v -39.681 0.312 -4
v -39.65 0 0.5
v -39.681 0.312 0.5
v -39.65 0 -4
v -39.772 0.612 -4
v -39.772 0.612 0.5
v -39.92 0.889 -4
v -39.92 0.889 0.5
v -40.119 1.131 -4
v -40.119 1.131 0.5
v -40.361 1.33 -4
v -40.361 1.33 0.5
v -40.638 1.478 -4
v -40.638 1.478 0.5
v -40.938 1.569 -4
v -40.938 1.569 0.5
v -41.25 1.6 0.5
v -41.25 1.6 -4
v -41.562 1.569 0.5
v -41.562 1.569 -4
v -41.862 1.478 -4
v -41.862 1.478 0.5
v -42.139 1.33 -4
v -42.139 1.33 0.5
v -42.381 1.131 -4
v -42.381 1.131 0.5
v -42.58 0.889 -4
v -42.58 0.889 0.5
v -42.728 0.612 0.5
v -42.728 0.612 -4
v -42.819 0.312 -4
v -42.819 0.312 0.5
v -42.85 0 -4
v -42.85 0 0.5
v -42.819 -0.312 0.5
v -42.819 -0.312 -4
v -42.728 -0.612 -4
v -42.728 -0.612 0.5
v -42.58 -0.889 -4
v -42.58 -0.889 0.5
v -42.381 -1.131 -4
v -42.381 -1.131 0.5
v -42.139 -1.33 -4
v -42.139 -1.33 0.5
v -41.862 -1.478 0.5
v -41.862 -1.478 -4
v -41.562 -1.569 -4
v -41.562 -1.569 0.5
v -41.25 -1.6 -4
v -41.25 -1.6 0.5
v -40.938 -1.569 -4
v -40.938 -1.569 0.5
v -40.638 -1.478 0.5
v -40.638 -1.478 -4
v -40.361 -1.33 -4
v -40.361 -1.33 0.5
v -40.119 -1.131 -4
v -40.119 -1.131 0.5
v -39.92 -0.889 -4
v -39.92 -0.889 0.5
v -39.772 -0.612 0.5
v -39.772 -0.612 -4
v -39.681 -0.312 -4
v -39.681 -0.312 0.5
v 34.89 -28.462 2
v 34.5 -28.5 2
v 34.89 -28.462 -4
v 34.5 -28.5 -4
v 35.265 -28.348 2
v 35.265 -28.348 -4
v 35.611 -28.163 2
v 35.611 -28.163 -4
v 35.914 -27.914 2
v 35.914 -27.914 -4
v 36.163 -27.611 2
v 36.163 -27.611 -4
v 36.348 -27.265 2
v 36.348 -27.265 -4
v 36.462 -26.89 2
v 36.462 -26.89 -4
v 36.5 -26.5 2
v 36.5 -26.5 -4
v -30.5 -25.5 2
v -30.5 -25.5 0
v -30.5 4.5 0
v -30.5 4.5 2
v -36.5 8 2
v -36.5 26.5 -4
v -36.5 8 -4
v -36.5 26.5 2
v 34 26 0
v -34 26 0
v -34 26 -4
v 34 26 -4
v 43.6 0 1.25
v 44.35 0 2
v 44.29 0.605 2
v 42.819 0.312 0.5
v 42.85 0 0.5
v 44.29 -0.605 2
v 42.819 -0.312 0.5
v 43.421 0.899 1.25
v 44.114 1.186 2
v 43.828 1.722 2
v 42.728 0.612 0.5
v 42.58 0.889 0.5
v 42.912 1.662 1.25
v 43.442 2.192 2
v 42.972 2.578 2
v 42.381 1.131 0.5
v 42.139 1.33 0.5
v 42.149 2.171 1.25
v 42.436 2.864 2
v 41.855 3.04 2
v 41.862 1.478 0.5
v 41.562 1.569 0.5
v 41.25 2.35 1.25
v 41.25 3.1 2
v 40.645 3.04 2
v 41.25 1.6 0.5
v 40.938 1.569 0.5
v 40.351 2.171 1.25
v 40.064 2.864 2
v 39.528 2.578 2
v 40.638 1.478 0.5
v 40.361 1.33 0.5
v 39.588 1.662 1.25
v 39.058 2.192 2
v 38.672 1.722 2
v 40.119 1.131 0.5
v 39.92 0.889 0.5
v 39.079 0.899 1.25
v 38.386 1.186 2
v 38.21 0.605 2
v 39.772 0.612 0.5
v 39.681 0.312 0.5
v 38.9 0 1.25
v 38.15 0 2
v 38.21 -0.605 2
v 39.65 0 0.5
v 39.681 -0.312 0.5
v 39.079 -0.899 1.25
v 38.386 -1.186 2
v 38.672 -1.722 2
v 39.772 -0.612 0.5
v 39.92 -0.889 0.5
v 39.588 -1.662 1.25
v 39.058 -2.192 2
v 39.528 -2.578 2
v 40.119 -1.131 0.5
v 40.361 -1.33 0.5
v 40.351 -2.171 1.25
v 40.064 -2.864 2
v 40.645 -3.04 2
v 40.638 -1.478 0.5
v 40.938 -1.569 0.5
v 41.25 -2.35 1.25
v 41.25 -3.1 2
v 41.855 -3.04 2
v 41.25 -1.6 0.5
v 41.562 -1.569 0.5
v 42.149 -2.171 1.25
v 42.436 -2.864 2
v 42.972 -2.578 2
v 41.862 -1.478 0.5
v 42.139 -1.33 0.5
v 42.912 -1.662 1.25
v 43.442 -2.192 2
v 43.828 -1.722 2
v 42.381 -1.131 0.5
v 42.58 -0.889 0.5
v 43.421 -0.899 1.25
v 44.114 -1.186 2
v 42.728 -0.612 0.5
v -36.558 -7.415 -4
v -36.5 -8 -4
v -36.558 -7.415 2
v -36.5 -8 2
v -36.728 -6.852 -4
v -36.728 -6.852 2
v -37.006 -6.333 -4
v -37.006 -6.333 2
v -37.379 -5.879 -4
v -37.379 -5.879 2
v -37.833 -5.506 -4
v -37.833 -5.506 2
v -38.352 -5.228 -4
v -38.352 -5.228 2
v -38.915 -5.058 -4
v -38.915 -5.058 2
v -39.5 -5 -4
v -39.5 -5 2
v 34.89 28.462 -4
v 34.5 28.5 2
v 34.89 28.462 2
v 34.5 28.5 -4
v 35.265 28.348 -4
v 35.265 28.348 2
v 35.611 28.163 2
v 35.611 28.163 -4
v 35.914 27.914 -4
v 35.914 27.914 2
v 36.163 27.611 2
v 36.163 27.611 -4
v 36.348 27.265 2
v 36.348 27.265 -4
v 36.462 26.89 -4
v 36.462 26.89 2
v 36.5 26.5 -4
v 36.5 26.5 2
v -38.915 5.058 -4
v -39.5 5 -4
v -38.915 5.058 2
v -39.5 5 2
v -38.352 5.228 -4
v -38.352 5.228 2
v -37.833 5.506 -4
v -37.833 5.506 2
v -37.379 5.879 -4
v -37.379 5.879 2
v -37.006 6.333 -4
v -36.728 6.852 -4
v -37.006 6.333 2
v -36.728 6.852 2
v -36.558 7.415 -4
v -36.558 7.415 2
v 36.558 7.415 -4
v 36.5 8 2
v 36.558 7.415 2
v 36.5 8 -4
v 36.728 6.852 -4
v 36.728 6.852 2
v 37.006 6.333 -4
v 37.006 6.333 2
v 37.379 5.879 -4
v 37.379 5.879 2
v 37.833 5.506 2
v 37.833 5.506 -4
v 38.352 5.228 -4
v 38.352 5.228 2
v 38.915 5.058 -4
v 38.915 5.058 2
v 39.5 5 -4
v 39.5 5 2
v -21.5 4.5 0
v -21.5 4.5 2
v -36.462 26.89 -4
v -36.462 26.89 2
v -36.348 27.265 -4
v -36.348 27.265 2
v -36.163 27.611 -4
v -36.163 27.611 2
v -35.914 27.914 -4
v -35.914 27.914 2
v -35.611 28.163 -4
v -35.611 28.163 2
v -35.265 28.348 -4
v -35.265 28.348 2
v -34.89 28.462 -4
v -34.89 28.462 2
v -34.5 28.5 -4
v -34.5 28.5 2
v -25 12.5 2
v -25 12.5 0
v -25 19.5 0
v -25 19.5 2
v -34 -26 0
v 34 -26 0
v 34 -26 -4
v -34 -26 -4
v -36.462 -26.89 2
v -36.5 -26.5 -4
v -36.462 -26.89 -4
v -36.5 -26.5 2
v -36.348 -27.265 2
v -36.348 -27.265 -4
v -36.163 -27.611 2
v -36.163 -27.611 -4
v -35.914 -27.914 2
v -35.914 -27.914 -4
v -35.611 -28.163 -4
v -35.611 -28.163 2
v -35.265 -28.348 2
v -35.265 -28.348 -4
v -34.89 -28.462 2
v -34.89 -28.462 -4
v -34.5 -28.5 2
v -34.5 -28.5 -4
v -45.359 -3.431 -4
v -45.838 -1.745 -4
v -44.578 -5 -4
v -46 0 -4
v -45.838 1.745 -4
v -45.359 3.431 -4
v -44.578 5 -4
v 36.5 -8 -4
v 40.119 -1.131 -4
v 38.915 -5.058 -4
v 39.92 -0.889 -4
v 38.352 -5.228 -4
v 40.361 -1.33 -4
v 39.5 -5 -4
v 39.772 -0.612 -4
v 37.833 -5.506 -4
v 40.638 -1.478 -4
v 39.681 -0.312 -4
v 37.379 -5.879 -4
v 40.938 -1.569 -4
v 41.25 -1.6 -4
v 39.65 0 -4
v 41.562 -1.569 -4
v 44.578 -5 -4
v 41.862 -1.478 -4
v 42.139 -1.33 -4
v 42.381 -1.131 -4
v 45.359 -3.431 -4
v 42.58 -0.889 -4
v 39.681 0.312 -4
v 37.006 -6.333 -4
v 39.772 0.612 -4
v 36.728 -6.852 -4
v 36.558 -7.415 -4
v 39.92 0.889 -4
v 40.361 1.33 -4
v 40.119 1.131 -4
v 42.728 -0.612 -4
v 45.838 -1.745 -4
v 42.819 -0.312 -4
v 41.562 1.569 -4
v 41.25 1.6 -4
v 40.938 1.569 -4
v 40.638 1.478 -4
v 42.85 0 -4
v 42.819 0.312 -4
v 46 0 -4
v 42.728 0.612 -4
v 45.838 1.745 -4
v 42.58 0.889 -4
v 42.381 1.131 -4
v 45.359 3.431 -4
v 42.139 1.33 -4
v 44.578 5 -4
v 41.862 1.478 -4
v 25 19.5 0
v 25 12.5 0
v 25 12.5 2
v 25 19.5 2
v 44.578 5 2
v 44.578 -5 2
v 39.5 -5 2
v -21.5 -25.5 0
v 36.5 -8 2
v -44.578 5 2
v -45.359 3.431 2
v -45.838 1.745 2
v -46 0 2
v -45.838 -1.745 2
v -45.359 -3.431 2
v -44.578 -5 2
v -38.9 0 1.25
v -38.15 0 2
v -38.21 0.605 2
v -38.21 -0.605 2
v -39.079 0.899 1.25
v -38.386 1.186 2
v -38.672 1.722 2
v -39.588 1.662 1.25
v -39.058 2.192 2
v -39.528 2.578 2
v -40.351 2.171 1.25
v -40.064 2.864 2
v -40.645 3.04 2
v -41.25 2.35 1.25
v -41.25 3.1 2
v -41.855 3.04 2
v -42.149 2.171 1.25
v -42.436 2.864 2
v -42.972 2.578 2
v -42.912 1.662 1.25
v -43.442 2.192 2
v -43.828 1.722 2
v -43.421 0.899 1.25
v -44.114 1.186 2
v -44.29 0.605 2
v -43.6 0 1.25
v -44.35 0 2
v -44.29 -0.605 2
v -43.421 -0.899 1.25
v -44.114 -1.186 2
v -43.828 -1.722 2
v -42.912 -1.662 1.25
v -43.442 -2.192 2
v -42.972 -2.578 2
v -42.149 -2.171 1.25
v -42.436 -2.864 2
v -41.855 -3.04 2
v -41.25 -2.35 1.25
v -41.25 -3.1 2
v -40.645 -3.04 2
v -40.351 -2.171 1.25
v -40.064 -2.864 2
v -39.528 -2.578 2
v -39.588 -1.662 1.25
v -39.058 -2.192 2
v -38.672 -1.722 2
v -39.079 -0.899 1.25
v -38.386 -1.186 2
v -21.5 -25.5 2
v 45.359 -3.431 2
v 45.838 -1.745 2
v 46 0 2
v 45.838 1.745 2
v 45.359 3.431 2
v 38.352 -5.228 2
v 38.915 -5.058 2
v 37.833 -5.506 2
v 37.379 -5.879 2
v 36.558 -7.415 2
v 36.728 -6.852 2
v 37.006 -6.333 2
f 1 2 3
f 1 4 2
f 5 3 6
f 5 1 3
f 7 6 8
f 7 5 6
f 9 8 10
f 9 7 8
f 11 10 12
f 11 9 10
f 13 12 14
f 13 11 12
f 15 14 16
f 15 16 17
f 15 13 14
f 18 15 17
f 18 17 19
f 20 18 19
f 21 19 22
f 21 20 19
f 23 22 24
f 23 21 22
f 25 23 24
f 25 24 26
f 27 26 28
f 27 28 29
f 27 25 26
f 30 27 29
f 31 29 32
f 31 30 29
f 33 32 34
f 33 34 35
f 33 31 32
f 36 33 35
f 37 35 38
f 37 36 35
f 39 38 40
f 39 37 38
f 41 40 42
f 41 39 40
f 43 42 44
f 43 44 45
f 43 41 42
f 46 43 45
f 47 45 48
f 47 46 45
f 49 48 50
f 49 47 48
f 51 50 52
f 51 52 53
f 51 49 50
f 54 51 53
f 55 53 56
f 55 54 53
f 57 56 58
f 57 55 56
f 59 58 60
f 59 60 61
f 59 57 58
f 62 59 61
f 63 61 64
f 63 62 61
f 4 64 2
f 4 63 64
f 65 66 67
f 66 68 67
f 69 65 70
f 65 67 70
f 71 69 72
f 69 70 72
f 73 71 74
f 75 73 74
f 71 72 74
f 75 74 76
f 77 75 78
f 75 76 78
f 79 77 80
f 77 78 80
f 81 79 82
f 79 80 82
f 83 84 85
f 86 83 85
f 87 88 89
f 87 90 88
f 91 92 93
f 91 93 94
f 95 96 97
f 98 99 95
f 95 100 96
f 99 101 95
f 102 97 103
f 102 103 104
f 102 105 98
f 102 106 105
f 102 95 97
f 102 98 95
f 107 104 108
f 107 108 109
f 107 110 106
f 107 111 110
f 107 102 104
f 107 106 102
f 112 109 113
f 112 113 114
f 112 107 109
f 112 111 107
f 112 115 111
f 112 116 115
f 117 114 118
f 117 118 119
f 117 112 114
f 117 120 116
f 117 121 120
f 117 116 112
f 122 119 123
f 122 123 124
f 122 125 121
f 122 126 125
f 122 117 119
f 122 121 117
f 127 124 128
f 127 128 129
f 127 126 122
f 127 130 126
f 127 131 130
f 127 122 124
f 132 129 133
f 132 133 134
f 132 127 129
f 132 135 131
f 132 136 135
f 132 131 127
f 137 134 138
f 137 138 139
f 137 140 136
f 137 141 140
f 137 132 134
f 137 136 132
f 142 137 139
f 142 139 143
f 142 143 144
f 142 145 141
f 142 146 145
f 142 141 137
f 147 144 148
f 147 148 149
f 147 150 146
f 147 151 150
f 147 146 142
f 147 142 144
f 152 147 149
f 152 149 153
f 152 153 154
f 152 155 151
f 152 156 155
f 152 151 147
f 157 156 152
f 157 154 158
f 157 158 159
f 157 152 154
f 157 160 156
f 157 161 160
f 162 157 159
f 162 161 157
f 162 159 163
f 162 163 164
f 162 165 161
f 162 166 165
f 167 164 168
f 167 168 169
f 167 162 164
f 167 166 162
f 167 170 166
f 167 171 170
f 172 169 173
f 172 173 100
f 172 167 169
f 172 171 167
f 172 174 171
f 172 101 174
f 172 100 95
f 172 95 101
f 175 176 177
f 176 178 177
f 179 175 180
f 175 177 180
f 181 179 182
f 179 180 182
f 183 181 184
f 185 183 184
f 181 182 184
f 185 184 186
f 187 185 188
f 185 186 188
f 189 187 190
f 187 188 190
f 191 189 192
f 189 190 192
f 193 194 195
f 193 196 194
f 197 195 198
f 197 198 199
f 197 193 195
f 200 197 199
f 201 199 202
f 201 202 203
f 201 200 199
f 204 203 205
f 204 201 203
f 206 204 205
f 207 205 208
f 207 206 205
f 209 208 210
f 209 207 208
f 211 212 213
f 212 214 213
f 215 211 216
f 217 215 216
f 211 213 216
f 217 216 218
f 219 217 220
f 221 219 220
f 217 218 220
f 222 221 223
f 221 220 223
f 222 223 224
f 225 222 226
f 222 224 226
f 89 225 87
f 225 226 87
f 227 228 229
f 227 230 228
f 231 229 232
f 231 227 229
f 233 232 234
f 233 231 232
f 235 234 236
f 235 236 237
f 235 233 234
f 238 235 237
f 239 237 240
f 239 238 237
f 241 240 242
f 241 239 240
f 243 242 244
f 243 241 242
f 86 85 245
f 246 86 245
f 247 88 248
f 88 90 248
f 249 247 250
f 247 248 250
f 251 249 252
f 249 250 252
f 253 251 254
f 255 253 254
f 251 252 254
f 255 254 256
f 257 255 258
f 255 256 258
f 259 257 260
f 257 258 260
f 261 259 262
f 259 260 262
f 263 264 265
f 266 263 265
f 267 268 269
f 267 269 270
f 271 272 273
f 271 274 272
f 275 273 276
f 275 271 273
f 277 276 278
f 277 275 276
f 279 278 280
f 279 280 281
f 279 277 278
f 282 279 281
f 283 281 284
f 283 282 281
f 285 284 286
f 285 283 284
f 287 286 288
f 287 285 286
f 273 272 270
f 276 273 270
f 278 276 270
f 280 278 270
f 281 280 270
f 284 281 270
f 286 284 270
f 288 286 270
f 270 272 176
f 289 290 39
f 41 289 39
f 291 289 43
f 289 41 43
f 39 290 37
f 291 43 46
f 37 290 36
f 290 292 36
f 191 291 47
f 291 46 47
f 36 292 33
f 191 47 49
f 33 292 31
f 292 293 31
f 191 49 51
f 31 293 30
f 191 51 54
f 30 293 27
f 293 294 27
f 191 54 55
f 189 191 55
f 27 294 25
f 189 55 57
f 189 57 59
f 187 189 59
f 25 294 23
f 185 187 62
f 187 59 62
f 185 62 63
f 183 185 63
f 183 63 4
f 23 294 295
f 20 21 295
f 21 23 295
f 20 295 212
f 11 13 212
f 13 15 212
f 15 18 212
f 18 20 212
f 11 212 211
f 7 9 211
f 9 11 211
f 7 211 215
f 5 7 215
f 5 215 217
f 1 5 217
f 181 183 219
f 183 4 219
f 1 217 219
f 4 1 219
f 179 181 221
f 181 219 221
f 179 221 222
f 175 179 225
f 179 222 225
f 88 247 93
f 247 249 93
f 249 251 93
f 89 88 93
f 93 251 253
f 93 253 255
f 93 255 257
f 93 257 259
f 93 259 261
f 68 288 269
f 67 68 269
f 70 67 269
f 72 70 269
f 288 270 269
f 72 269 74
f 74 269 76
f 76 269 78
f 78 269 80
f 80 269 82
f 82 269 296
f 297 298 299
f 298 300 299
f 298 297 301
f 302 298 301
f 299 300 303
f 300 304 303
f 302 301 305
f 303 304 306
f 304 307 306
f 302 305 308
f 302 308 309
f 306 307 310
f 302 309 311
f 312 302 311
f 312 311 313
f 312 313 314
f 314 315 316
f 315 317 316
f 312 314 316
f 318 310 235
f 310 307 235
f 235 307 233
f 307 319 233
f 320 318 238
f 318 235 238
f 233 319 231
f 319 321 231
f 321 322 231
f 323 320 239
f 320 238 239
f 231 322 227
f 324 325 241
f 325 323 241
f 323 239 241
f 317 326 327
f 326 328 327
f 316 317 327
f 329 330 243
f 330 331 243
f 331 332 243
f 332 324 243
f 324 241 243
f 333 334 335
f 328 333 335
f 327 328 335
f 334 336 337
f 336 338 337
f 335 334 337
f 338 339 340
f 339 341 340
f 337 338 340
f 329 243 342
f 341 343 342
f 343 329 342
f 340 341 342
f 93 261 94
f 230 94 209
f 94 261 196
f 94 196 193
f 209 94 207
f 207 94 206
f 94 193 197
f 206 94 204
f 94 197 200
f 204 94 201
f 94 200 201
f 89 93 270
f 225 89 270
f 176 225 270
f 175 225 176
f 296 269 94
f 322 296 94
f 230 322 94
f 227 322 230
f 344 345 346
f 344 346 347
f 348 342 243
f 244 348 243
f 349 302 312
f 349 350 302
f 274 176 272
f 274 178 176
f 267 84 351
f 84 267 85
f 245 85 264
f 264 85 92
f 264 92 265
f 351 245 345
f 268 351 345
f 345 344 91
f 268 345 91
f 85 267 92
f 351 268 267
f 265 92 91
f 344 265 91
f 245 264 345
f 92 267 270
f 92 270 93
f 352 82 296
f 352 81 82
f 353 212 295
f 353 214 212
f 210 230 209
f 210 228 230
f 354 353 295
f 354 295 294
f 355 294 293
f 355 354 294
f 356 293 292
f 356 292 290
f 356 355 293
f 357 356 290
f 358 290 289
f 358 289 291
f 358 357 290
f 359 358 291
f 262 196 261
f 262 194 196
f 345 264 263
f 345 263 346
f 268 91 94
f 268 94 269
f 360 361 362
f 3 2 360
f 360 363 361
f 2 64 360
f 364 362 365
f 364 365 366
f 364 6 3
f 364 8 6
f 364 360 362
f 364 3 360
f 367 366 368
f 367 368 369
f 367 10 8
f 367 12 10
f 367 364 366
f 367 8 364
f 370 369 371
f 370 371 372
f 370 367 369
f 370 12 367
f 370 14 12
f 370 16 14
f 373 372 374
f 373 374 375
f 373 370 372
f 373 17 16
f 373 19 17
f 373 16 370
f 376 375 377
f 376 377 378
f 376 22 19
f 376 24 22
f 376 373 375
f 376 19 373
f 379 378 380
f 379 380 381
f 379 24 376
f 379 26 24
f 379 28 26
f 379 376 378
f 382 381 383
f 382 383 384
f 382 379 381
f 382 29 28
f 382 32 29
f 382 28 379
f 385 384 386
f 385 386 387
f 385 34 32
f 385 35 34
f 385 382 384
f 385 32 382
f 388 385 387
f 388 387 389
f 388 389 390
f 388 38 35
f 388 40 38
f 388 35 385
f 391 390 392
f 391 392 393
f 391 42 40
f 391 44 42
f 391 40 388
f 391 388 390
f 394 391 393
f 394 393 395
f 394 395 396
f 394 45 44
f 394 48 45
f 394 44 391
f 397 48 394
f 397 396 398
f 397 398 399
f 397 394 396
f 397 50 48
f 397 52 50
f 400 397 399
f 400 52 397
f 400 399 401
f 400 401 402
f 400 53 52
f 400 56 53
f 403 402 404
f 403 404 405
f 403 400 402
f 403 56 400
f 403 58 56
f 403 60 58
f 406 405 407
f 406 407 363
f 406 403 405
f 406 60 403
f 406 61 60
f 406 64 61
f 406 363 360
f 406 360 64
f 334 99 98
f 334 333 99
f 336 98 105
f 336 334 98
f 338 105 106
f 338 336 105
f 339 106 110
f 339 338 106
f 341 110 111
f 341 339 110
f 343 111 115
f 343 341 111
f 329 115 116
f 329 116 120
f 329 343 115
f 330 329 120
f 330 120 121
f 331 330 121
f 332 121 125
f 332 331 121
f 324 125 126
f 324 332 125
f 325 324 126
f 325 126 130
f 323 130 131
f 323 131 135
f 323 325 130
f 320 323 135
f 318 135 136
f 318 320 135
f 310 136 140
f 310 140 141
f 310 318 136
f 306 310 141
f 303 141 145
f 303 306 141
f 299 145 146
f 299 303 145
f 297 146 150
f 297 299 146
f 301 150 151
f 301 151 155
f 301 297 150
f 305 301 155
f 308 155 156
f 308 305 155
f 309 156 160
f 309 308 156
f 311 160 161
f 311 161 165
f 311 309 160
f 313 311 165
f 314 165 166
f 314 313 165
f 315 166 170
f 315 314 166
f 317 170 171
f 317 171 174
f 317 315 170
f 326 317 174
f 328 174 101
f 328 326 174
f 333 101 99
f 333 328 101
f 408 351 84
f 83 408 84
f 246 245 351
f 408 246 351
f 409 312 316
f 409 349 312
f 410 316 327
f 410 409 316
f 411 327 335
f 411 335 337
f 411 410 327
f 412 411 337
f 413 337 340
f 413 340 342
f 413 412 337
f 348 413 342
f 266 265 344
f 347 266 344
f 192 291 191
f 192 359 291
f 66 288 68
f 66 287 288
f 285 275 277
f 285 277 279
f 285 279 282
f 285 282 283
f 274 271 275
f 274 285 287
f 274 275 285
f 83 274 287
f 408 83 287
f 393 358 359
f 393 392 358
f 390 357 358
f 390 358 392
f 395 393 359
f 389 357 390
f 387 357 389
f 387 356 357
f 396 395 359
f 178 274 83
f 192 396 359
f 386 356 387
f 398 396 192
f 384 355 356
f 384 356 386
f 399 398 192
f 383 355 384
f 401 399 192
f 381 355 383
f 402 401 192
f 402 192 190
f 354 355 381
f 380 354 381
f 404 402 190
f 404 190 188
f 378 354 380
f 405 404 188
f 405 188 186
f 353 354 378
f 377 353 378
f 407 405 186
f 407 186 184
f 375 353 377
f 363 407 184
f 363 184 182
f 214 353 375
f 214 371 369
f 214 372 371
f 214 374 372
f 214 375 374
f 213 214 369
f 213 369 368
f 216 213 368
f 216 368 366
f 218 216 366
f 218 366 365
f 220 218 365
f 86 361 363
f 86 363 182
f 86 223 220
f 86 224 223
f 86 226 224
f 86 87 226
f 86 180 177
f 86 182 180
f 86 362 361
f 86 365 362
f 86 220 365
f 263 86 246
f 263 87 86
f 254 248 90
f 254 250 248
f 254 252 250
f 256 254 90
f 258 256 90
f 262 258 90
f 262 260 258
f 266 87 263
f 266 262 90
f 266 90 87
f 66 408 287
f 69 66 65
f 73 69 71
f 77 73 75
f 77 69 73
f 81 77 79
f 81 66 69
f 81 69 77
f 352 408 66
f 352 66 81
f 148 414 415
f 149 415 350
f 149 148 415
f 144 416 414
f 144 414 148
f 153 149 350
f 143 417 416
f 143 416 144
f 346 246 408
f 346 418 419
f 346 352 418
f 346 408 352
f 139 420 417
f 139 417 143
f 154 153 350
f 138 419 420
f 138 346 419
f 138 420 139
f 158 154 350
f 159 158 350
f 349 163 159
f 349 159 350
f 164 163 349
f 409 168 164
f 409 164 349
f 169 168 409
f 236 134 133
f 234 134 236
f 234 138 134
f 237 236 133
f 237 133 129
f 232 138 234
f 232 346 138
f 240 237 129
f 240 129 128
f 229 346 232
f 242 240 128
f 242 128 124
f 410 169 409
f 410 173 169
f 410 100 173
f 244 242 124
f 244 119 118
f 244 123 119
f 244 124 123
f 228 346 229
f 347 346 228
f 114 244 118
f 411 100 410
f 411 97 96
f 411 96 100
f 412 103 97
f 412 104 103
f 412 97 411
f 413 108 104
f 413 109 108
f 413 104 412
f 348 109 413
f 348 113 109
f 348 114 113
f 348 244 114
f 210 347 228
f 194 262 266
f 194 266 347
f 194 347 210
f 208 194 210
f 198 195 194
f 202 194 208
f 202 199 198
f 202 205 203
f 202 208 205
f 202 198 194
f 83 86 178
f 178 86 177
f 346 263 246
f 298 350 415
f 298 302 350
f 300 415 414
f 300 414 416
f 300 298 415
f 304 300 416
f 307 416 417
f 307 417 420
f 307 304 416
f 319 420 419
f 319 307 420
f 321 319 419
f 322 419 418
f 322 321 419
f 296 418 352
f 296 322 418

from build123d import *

# Parameters (mm, degrees)
F0_W     = 50
F0_H     = 7
F0_R     = 1.6
F1_DEPTH = 2
F2_DEPTH = 4
F3_SIZE  = 1.5
F4_R     = 3
F5_R     = 2


with BuildPart() as f1:
    # F0 (on Top) → F1 (new body)
    with BuildSketch(Plane.XY):
        with BuildLine():
            Line((-36.5, -5), (-36.5, 5))
            Line((-36.5, 5), (-44.577747, 5))
            ThreePointArc((-44.577747, 5), (-46, 0), (-44.577747, -5))
            Line((-44.577747, -5), (-36.5, -5))
        make_face()
        Polygon((-38.5, 1.587713), (-38.5, -1.587713), (-41.25, -3.175426), (-44, -1.587713), (-44, 1.587713), (-41.25, 3.175426), align=None, mode=Mode.SUBTRACT)
        Polygon((36.5, 28.5), (-36.5, 28.5), (-36.5, 5), (-36.5, -5), (-36.5, -28.5), (36.5, -28.5), (36.5, -5), (36.5, 5), align=None)
        Polygon((-34, 21.050253), (-34, 26), (-29.050253, 26), (29.050253, 26), (34, 26), (34, 21.050253), (34, -21.050253), (34, -26), (29.050253, -26), (-29.050253, -26), (-34, -26), (-34, -21.050253), align=None, mode=Mode.SUBTRACT)
        Polygon((29.050253, 26), (-29.050253, 26), (-34, 21.050253), (-34, -21.050253), (-30.5, -24.550253), (-30.5, 4.5), (-21.5, 4.5), (-21.5, -25.5), (-29.550253, -25.5), (-29.050253, -26), (29.050253, -26), (34, -21.050253), (34, 21.050253), align=None)
        with Locations((0, 16)):
            Rectangle(F0_W, F0_H, mode=Mode.SUBTRACT)
        with BuildLine():
            Line((44.577747, 5), (36.5, 5))
            Line((36.5, 5), (36.5, -5))
            Line((36.5, -5), (44.577747, -5))
            ThreePointArc((44.577747, -5), (46, 0), (44.577747, 5))
        make_face()
        Polygon((41.25, -3.175426), (38.5, -1.587713), (38.5, 1.587713), (41.25, 3.175426), (44, 1.587713), (44, -1.587713), align=None, mode=Mode.SUBTRACT)
        Polygon((-41.25, -3.175426), (-38.5, -1.587713), (-38.5, 1.587713), (-41.25, 3.175426), (-44, 1.587713), (-44, -1.587713), align=None)
        with Locations((-41.25, 0)):
            Circle(F0_R, mode=Mode.SUBTRACT)
        Polygon((38.5, 1.587713), (38.5, -1.587713), (41.25, -3.175426), (44, -1.587713), (44, 1.587713), (41.25, 3.175426), align=None)
        with Locations((41.25, 0)):
            Circle(F0_R, mode=Mode.SUBTRACT)
        Polygon((34, 26), (29.050253, 26), (34, 21.050253), align=None)
        Polygon((-29.050253, 26), (-34, 26), (-34, 21.050253), align=None)
        Polygon((-30.5, -24.550253), (-34, -21.050253), (-34, -26), (-29.050253, -26), (-29.550253, -25.5), (-30.5, -25.5), align=None)
        Polygon((34, -26), (34, -21.050253), (29.050253, -26), align=None)
    extrude(amount=F1_DEPTH)

    # F0 (on Top) → F2 (join)
    with BuildSketch(Plane.XY):
        Polygon((36.5, 28.5), (-36.5, 28.5), (-36.5, 5), (-36.5, -5), (-36.5, -28.5), (36.5, -28.5), (36.5, -5), (36.5, 5), align=None)
        Polygon((-34, 21.050253), (-34, 26), (-29.050253, 26), (29.050253, 26), (34, 26), (34, 21.050253), (34, -21.050253), (34, -26), (29.050253, -26), (-29.050253, -26), (-34, -26), (-34, -21.050253), align=None, mode=Mode.SUBTRACT)
        with BuildLine():
            Line((-36.5, -5), (-36.5, 5))
            Line((-36.5, 5), (-44.577747, 5))
            ThreePointArc((-44.577747, 5), (-46, 0), (-44.577747, -5))
            Line((-44.577747, -5), (-36.5, -5))
        make_face()
        Polygon((-38.5, 1.587713), (-38.5, -1.587713), (-41.25, -3.175426), (-44, -1.587713), (-44, 1.587713), (-41.25, 3.175426), align=None, mode=Mode.SUBTRACT)
        Polygon((-41.25, -3.175426), (-38.5, -1.587713), (-38.5, 1.587713), (-41.25, 3.175426), (-44, 1.587713), (-44, -1.587713), align=None)
        with Locations((-41.25, 0)):
            Circle(F0_R, mode=Mode.SUBTRACT)
        with BuildLine():
            Line((44.577747, 5), (36.5, 5))
            Line((36.5, 5), (36.5, -5))
            Line((36.5, -5), (44.577747, -5))
            ThreePointArc((44.577747, -5), (46, 0), (44.577747, 5))
        make_face()
        Polygon((41.25, -3.175426), (38.5, -1.587713), (38.5, 1.587713), (41.25, 3.175426), (44, 1.587713), (44, -1.587713), align=None, mode=Mode.SUBTRACT)
        Polygon((38.5, 1.587713), (38.5, -1.587713), (41.25, -3.175426), (44, -1.587713), (44, 1.587713), (41.25, 3.175426), align=None)
        with Locations((41.25, 0)):
            Circle(F0_R, mode=Mode.SUBTRACT)
    extrude(amount=-F2_DEPTH)

    # F3
    f3_edges = [f1.edges().sort_by_distance(p)[0] for p in [
        (-42.85, 0, 2),
        (39.65, 0, 2),
    ]]
    chamfer(f3_edges, length=F3_SIZE)

    # F4
    f4_edges = [f1.edges().sort_by_distance(p)[0] for p in [
        (-36.5, -5, -1),
        (-36.5, 5, -1),
        (36.5, -5, -1),
        (36.5, 5, -1),
    ]]
    fillet(f4_edges, radius=F4_R)

    # F5
    f5_edges = [f1.edges().sort_by_distance(p)[0] for p in [
        (36.5, 28.5, -1),
        (-36.5, 28.5, -1),
        (-36.5, -28.5, -1),
        (36.5, -28.5, -1),
    ]]
    fillet(f5_edges, radius=F5_R)


solid = f1.part
